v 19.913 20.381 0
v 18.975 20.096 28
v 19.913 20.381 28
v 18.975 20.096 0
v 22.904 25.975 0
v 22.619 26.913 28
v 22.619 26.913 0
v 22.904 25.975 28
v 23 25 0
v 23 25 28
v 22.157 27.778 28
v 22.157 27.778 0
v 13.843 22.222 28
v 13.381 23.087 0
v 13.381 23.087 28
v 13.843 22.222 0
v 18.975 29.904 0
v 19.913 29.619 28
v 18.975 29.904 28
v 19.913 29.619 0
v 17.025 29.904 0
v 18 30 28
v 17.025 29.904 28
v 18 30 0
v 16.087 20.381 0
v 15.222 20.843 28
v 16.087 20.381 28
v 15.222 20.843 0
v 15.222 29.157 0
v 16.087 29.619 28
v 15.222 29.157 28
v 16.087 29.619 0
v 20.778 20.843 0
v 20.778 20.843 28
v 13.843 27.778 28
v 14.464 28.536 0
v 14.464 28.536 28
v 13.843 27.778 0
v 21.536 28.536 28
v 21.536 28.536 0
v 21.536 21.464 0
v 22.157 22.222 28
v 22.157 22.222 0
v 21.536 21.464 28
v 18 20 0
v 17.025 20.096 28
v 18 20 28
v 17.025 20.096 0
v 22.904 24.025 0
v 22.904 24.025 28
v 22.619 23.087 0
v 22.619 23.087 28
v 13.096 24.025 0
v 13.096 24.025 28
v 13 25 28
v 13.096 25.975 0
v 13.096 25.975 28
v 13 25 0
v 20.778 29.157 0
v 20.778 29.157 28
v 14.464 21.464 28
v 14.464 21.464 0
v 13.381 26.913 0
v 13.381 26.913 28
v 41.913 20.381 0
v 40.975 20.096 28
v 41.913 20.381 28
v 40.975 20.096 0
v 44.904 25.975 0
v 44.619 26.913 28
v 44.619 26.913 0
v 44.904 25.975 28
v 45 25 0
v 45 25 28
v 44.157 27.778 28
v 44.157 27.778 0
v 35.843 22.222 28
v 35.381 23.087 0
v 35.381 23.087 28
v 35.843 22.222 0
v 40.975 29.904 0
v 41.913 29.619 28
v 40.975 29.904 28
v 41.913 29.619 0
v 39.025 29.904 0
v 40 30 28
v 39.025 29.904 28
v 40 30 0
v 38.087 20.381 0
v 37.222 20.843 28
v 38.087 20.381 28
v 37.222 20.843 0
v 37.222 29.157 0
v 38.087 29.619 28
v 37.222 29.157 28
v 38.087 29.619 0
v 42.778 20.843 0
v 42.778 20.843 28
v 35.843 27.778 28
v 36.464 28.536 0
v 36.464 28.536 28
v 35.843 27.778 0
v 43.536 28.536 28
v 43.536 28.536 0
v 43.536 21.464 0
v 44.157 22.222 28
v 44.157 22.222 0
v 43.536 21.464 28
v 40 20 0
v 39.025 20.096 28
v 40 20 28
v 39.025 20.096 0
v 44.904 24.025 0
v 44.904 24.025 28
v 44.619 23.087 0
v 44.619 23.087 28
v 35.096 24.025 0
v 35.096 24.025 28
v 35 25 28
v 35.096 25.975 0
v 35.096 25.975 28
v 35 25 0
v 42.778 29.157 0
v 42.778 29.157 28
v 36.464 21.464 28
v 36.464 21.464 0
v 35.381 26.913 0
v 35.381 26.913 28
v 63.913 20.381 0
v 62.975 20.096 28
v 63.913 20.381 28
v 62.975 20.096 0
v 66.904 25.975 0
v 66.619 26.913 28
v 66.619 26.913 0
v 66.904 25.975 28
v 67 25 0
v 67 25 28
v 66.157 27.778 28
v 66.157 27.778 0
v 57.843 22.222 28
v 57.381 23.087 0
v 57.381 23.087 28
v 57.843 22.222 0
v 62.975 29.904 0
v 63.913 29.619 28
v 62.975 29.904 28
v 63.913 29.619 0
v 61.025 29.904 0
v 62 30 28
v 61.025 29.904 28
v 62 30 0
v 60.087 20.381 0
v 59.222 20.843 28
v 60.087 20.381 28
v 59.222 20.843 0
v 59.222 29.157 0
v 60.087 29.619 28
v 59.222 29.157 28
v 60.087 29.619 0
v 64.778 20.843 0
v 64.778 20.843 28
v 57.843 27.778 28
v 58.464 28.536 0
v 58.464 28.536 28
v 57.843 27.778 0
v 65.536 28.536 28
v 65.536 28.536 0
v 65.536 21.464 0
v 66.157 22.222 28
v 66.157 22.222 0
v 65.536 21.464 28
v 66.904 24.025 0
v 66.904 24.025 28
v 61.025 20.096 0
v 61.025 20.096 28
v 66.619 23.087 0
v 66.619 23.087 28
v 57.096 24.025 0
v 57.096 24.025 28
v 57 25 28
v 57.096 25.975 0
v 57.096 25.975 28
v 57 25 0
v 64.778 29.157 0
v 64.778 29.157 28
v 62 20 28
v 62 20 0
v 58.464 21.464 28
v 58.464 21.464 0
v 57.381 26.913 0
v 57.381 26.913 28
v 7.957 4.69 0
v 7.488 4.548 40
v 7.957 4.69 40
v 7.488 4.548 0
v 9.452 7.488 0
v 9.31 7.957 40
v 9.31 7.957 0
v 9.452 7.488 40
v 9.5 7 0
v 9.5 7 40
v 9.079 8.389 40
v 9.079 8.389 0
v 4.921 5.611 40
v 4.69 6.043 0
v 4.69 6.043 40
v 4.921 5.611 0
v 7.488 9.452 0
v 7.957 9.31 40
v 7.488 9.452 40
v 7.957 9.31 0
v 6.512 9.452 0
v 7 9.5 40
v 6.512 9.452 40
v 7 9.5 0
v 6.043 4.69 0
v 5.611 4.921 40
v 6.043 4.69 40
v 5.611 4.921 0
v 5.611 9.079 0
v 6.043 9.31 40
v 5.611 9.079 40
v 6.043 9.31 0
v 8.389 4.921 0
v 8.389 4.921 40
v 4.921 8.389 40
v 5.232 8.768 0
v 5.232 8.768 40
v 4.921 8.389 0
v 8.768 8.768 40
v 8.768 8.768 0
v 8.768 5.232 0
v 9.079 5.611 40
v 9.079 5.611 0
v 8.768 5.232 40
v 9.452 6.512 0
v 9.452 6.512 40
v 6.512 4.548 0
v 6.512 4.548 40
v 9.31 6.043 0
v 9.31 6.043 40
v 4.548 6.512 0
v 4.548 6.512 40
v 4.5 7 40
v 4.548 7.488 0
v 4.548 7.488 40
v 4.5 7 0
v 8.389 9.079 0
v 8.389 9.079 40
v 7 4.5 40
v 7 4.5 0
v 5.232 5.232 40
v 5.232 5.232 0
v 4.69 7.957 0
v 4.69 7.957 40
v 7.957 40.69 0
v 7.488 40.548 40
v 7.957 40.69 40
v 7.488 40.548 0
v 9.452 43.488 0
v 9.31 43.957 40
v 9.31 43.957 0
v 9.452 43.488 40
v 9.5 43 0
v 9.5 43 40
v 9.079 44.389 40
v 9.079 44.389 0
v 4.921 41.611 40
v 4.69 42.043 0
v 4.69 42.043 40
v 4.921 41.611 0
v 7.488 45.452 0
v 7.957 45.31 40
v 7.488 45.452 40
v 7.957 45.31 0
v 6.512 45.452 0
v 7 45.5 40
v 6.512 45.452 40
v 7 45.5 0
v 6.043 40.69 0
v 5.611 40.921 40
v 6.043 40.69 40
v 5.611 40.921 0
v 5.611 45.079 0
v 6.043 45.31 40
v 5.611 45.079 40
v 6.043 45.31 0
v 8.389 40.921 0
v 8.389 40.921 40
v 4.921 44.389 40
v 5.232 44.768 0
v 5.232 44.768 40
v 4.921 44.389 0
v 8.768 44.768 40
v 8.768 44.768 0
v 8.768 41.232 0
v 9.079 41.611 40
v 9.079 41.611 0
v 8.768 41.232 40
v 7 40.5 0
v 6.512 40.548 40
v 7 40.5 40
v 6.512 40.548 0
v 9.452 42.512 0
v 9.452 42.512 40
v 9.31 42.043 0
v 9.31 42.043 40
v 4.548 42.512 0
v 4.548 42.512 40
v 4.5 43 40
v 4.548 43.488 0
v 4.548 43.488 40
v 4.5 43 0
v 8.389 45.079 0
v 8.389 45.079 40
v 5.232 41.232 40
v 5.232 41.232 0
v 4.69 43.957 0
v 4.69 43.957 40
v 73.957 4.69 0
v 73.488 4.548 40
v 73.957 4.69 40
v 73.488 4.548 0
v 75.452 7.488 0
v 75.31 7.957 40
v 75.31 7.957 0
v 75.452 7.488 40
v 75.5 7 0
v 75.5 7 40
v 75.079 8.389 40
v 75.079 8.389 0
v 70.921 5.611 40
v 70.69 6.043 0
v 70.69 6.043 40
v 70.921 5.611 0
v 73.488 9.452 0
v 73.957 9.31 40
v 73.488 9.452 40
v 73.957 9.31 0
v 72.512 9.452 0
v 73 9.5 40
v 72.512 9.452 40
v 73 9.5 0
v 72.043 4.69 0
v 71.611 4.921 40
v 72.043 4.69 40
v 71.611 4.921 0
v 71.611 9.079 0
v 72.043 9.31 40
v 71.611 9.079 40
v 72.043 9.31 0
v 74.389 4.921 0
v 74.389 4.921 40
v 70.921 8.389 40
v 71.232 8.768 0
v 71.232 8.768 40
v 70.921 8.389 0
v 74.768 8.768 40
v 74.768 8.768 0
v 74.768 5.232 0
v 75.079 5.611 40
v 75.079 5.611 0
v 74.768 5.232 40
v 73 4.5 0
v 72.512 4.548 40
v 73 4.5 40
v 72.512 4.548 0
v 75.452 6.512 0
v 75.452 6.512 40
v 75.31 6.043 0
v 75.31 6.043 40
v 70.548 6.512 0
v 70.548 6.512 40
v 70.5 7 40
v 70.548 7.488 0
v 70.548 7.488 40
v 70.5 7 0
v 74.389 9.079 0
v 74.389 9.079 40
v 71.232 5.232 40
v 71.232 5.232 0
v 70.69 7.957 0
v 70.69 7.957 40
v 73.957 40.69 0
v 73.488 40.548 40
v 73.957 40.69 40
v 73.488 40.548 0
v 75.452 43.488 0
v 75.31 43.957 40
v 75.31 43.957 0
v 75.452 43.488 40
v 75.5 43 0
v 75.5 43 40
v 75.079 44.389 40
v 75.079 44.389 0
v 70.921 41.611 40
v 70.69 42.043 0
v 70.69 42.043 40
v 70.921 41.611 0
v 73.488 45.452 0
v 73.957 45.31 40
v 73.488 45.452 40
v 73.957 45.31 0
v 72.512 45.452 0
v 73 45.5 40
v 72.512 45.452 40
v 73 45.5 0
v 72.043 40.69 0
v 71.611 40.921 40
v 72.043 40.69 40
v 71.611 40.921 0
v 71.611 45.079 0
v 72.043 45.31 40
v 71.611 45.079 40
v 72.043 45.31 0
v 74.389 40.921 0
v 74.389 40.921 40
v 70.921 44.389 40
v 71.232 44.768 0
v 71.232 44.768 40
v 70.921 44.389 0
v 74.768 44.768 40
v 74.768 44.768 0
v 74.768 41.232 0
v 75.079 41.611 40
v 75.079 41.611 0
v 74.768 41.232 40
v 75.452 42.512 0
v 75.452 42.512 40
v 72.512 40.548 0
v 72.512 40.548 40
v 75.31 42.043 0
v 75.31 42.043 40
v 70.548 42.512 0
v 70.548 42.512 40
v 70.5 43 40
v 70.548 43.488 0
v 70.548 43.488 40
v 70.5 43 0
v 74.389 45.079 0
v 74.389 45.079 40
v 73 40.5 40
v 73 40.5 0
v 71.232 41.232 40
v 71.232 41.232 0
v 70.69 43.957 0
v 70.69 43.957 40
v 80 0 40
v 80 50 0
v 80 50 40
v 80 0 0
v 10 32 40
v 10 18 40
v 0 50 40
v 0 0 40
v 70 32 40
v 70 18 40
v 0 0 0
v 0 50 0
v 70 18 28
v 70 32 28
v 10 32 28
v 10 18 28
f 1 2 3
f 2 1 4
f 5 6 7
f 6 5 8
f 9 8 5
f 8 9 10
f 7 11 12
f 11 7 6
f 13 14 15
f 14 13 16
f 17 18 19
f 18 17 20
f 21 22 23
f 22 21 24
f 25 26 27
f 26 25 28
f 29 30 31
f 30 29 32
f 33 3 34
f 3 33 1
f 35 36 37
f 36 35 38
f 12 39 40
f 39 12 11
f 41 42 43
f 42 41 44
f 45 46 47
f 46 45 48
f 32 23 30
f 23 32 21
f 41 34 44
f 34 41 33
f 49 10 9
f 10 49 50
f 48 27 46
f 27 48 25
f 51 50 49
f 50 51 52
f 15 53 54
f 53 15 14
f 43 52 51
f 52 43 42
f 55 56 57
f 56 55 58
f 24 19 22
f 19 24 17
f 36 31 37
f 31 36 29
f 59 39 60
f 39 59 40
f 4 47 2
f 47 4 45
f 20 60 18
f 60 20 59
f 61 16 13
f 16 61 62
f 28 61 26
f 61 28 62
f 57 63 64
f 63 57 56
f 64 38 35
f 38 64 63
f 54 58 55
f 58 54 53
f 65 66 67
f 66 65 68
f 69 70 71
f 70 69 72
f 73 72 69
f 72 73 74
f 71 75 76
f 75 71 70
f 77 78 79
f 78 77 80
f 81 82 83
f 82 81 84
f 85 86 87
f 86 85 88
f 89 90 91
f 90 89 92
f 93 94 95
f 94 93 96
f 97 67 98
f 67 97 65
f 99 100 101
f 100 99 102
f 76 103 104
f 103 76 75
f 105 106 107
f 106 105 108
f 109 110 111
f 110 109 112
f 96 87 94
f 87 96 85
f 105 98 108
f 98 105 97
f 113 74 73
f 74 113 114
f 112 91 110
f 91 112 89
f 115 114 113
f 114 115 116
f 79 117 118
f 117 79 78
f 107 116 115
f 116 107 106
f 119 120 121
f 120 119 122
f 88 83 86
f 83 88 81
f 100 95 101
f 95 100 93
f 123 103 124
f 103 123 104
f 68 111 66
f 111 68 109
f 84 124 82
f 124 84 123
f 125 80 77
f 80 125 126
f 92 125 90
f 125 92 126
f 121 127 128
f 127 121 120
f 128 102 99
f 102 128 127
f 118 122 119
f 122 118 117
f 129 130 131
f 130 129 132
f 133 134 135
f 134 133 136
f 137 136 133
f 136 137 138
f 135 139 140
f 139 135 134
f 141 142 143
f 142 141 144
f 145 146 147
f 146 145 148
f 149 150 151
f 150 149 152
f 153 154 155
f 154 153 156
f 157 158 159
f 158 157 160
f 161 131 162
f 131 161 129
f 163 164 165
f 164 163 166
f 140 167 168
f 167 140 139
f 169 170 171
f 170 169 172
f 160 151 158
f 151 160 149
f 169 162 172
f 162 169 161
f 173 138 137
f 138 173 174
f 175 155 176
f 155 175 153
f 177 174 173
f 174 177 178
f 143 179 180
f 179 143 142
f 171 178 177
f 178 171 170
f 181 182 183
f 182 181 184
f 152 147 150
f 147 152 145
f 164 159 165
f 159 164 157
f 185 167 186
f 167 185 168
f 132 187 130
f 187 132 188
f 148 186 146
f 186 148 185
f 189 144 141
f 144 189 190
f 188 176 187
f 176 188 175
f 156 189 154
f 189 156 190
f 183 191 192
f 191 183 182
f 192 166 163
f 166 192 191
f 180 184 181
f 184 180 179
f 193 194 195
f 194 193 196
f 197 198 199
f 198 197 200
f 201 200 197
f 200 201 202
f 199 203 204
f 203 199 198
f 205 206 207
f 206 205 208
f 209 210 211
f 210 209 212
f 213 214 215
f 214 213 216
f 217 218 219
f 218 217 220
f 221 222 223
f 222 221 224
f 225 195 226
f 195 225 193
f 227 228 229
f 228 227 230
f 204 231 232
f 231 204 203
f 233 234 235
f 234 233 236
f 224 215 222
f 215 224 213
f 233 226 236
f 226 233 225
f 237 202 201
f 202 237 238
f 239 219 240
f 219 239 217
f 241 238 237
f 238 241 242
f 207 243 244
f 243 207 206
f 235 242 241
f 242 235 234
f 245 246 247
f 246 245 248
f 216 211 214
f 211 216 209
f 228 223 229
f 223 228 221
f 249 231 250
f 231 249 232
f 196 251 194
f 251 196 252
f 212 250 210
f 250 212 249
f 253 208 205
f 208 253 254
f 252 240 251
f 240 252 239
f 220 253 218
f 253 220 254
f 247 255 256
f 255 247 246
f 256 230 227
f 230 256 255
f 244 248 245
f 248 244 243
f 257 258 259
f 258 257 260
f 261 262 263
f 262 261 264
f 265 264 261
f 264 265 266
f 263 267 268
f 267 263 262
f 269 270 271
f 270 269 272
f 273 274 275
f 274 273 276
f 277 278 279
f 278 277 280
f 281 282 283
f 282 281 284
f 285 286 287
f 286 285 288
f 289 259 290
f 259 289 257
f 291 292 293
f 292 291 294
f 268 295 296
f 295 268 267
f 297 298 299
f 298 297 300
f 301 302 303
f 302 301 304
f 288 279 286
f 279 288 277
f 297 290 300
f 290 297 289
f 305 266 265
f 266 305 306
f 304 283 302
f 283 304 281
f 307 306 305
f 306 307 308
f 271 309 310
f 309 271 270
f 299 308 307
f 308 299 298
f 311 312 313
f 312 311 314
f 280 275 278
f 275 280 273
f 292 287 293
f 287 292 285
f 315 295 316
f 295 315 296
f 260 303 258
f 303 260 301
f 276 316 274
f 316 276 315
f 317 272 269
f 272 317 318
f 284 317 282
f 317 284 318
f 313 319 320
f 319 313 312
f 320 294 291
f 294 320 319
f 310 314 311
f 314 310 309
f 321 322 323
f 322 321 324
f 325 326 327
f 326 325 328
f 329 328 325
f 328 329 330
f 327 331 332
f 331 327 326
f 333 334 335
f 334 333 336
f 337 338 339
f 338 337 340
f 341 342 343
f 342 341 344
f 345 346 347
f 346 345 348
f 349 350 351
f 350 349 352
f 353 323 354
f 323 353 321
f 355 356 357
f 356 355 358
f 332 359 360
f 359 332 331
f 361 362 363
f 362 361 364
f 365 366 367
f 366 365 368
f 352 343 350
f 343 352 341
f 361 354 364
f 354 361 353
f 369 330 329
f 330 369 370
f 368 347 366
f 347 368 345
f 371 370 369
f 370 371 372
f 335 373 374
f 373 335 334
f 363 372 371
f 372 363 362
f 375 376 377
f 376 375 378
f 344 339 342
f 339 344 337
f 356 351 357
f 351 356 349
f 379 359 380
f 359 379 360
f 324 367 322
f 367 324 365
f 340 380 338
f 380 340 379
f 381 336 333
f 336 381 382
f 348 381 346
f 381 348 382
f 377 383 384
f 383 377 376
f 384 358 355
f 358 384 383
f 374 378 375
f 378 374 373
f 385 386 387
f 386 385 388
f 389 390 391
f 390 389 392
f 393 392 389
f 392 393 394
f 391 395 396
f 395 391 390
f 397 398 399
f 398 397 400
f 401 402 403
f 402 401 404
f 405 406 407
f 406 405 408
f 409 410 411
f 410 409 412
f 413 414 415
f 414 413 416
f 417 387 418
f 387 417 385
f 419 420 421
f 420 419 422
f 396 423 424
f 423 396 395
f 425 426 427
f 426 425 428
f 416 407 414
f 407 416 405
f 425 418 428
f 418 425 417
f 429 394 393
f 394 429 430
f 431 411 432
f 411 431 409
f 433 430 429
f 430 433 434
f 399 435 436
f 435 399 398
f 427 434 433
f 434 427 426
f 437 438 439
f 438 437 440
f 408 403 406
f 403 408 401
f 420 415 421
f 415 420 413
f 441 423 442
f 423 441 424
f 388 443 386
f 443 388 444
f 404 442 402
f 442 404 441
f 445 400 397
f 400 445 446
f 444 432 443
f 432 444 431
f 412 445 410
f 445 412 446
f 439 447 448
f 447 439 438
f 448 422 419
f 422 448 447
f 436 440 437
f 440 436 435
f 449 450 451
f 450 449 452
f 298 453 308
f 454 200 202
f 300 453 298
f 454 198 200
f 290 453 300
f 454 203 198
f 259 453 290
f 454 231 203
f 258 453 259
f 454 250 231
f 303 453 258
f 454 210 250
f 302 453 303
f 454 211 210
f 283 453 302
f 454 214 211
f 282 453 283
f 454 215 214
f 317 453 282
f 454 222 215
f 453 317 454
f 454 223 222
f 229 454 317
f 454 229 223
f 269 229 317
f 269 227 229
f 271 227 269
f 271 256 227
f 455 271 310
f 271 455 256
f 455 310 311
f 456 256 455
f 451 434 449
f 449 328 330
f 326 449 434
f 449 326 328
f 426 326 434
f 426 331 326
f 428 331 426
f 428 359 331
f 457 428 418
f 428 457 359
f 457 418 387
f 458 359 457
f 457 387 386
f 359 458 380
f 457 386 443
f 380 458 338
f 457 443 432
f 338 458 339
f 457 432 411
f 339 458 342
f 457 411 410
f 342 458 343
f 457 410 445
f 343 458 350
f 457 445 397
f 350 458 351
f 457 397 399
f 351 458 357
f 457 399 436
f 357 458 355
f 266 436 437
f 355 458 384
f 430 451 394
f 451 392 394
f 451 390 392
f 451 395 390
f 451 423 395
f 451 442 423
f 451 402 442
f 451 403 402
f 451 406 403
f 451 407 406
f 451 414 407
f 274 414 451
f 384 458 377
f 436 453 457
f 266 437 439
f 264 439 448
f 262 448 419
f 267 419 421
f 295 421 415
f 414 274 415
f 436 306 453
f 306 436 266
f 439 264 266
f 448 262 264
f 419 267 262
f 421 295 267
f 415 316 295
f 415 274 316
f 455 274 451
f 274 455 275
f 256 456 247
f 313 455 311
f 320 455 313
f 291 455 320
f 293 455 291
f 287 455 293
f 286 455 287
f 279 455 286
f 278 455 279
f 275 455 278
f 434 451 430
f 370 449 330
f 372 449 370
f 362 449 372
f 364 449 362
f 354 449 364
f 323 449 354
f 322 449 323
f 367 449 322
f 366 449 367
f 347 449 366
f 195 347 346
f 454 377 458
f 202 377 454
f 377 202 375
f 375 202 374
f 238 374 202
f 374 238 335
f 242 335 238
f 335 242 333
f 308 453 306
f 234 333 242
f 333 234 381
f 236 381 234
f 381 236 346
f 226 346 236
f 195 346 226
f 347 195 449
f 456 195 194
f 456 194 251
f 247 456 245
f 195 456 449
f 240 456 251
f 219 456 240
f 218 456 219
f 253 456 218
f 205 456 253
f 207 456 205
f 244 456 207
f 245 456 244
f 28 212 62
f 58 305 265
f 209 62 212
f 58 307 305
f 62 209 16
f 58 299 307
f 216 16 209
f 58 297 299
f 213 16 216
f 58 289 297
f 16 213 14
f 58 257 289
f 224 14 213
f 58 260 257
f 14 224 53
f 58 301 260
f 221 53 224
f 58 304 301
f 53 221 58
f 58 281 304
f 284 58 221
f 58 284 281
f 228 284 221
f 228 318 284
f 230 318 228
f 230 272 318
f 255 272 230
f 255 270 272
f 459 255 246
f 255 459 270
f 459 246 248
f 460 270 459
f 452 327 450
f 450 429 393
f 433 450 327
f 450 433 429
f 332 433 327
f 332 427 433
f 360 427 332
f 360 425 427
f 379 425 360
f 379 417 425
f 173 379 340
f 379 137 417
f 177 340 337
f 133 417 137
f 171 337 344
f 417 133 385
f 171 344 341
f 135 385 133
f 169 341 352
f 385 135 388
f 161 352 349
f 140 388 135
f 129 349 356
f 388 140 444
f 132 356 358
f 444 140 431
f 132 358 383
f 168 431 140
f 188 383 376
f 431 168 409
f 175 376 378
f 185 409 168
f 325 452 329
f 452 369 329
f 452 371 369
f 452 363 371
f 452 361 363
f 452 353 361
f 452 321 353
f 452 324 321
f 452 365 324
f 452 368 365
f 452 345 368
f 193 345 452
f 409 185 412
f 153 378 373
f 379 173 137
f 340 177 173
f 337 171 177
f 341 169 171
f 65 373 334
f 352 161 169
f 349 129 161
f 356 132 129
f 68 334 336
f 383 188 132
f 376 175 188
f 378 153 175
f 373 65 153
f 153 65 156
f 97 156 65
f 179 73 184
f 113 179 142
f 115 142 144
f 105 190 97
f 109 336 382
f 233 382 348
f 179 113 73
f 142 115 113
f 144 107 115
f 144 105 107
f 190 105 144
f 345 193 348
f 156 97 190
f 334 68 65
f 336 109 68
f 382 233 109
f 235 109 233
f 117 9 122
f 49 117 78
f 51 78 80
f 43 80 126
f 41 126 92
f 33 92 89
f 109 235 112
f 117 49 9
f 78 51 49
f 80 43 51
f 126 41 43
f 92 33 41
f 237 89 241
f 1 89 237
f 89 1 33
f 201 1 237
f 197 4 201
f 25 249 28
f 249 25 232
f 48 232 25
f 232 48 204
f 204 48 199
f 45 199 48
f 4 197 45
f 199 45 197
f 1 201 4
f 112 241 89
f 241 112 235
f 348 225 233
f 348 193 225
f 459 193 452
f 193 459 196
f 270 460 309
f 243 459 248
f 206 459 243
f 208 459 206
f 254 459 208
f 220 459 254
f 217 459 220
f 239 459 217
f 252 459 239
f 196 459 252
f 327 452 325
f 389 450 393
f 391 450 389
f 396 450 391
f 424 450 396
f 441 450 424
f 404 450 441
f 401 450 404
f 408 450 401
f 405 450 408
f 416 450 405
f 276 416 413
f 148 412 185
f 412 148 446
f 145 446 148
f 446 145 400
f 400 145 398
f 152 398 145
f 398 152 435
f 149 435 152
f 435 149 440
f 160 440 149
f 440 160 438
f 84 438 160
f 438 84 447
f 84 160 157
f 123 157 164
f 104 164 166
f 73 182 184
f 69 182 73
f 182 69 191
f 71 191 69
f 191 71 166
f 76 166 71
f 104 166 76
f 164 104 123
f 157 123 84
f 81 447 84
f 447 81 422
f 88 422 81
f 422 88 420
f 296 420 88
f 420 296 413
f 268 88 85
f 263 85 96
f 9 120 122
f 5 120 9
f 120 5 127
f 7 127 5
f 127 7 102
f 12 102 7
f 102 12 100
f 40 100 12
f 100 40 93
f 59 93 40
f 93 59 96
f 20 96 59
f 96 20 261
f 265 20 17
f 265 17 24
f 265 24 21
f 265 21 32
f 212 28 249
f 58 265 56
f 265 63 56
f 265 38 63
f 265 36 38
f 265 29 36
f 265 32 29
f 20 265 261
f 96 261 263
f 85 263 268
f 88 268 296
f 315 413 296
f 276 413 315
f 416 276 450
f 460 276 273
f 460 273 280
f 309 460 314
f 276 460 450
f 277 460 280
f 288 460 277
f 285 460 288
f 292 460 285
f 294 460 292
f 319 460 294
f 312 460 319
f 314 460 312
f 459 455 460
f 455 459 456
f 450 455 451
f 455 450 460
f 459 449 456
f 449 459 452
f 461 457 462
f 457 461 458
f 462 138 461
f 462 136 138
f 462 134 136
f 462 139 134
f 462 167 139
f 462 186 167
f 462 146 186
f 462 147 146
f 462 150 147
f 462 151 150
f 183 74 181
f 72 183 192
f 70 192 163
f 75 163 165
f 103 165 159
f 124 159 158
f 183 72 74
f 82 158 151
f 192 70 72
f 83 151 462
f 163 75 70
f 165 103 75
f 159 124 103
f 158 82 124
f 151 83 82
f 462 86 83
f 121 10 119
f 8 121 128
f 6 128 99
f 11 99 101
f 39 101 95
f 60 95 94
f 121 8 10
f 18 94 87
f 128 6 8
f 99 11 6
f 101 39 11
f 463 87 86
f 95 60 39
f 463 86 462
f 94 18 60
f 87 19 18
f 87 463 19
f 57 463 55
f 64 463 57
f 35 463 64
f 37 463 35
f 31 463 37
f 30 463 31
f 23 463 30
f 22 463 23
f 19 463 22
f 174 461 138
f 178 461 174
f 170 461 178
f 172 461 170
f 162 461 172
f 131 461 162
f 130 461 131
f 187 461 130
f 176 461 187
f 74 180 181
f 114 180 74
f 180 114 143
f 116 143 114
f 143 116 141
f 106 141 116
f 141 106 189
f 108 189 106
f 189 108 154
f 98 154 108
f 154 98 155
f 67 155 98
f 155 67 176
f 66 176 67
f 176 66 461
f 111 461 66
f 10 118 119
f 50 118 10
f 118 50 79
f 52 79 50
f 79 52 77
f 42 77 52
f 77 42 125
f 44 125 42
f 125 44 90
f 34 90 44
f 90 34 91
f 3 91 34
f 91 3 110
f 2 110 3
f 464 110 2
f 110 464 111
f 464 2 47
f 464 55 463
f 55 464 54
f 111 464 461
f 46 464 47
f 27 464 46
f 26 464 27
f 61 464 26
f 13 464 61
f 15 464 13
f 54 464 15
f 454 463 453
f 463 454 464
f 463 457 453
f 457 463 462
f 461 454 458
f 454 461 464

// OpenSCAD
$fn = 32;

// ----------------------------------------------------------------------
// Manifold block: gallery_top manifold
// ----------------------------------------------------------------------

// --- parameters (mm) ---
block_l = 80;             // block length, X
block_w = 50;             // block width, Y
block_h = 40;             // block height, Z
port_d = 10;              // port bore diameter
port_pitch = 22;          // port pitch along X
gallery_d = 14;           // top gallery width, Y
gallery_depth = 12;       // gallery pocket depth
wall_p = 10;              // gallery end wall thickness, X
mnt_d = 5;                // mounting hole diameter
mnt_in = 7;               // mounting hole inset from the edges

n_ports = 3;  // ports in the row
port_x0 = (block_l - (n_ports - 1) * port_pitch) / 2;  // first port X

difference() {
  cube([block_l, block_w, block_h]);
  for (i = [0 : n_ports - 1])
    translate([port_x0 + i * port_pitch, block_w / 2, -1])
      cylinder(h = block_h + 2, d = port_d);
  translate([wall_p, block_w / 2 - gallery_d / 2, block_h - gallery_depth])
    cube([block_l - 2 * wall_p, gallery_d, gallery_depth + 1]);
  for (cx = [mnt_in, block_l - mnt_in])
    for (cy = [mnt_in, block_w - mnt_in])
      translate([cx, cy, -1]) cylinder(h = block_h + 2, d = mnt_d);
}
